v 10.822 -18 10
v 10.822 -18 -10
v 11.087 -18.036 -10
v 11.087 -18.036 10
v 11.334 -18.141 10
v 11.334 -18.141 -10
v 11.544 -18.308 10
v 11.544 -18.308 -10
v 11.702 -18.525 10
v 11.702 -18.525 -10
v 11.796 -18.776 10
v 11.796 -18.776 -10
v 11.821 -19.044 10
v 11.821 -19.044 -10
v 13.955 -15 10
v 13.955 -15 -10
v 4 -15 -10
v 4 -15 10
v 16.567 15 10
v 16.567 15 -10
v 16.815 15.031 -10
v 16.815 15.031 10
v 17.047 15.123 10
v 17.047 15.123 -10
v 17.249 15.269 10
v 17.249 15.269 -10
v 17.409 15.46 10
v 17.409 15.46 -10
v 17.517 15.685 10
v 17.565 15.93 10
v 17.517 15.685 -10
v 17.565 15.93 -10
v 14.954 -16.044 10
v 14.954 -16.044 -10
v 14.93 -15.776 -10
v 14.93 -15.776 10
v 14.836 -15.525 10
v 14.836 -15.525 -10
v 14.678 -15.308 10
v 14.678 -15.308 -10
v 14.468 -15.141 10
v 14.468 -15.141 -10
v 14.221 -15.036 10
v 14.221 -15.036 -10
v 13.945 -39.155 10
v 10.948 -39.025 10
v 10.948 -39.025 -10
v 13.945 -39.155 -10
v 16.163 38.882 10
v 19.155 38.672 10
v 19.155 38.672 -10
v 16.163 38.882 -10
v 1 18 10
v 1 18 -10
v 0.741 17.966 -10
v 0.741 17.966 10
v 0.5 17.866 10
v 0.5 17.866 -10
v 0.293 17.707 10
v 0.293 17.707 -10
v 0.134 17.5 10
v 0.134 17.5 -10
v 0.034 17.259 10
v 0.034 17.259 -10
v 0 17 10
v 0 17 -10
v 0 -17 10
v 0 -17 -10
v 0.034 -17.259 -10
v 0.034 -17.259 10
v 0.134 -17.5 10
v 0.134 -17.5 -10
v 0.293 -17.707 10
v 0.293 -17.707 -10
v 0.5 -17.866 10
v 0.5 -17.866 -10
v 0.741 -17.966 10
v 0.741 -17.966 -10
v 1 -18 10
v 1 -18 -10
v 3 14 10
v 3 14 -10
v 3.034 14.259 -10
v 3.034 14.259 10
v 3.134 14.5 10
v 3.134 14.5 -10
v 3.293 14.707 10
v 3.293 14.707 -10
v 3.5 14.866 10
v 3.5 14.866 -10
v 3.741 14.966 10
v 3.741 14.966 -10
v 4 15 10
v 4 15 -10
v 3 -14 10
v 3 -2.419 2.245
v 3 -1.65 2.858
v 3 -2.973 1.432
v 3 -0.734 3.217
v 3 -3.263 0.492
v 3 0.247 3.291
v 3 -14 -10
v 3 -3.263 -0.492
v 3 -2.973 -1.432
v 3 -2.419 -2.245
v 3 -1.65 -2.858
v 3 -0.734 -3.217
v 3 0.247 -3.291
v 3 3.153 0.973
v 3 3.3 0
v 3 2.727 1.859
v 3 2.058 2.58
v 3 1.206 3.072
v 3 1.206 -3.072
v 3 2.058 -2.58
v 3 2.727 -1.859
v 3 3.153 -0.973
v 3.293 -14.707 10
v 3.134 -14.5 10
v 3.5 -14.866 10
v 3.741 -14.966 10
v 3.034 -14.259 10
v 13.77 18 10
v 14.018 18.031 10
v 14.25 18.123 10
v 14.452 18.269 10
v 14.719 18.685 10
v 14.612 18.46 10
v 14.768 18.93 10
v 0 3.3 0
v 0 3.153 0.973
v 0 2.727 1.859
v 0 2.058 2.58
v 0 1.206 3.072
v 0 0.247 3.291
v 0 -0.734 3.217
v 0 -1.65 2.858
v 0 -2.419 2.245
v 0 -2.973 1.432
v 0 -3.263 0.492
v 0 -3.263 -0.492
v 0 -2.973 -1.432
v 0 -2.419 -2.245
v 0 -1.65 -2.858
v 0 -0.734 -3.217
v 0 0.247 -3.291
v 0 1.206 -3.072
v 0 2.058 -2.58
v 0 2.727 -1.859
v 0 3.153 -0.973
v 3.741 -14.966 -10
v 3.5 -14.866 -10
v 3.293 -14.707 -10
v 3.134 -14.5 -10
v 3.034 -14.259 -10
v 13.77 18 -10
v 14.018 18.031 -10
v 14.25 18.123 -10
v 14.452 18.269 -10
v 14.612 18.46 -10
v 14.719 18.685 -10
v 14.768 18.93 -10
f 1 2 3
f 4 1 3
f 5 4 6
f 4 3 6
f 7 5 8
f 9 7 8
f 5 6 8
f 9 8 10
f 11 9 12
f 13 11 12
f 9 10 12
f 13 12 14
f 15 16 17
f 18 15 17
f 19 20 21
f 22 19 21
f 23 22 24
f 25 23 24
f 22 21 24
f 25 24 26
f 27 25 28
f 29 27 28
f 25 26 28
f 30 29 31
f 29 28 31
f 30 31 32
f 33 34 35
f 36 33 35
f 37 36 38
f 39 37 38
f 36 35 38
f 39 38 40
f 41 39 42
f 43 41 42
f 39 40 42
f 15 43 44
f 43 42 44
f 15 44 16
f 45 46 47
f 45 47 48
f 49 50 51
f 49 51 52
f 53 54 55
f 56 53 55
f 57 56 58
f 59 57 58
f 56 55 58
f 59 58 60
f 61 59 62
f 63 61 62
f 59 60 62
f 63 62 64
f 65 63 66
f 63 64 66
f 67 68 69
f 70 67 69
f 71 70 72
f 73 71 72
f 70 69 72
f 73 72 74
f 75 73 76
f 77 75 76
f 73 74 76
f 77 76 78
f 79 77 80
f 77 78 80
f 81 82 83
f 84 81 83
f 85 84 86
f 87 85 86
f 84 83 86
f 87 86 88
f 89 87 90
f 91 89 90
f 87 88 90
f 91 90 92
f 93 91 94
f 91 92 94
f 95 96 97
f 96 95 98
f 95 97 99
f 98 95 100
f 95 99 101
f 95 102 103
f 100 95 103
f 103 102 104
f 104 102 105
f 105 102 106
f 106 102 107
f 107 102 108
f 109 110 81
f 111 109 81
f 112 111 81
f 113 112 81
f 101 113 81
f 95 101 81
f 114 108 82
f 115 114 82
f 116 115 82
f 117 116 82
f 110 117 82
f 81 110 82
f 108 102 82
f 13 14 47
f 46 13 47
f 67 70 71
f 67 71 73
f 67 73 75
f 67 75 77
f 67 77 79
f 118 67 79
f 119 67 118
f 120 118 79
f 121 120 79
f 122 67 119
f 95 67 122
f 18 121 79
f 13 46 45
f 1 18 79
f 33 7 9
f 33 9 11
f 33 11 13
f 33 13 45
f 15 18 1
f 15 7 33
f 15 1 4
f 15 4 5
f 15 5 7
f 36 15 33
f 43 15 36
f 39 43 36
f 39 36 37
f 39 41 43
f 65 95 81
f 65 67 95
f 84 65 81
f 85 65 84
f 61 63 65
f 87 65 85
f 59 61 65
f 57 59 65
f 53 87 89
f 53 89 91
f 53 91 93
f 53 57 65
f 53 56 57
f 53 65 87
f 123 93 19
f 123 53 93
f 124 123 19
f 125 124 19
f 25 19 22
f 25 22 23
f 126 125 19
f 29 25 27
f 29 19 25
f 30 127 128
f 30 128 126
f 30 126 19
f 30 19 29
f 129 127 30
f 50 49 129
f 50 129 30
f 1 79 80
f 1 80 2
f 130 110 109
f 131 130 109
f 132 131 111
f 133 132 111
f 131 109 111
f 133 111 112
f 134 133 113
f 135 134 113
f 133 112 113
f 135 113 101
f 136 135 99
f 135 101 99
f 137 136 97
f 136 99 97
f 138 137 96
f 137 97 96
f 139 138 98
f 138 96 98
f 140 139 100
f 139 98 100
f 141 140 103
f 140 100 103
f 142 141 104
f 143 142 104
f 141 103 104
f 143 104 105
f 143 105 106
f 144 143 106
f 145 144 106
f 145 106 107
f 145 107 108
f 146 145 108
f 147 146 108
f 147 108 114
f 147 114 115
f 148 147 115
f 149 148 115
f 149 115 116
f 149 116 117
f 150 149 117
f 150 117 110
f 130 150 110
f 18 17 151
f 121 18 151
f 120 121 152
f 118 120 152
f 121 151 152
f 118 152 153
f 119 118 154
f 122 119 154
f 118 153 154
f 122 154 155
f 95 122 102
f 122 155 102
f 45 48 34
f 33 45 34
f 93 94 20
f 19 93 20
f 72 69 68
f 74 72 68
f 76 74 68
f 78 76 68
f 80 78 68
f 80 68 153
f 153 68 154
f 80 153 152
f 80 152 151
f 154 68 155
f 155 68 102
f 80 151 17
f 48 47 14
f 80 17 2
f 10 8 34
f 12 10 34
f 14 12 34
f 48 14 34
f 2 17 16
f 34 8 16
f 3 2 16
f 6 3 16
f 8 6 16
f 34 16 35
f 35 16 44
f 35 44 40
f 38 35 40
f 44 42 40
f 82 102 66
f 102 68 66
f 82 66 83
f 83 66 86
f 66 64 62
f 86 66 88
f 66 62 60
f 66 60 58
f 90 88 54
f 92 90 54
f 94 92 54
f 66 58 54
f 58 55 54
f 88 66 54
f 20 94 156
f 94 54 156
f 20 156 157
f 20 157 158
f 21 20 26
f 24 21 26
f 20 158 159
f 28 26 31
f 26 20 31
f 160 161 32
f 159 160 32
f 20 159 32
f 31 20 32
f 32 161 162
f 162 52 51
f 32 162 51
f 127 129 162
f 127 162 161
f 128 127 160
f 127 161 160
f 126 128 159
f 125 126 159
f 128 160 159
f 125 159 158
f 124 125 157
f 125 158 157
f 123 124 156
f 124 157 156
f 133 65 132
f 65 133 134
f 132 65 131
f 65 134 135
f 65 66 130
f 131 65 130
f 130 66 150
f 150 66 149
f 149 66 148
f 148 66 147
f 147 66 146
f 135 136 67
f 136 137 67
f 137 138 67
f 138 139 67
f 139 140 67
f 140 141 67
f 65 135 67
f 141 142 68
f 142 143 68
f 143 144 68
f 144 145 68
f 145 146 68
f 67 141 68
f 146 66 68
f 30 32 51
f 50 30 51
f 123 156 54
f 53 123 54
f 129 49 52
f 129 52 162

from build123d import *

# Parameters (mm, degrees)
EXTRUDE_1_DEPTH      = 10
EXTRUDE_1_DEPTH_BACK = 10
HOLE_WIZARD_M61_D    = 6.6


with BuildPart() as part:
    # Эскиз1 → Бобышка-Вытянуть1 (new, two sides: drawn at the far end of the back side and taken through both)
    with BuildSketch(Plane.XY.offset(-EXTRUDE_1_DEPTH_BACK)):
        with BuildLine():
            Line((0, 17), (0, -17))
            ThreePointArc((0, -17), (0.292893219, -17.707106781), (1, -18))
            Line((1, -18), (10.821545488, -18))
            ThreePointArc((10.821545488, -18), (11.54390945, -18.308486944), (11.820593709, -19.043619387))
            Line((11.820593709, -19.043619387), (10.948205962, -39.024583819))
            Line((10.948205962, -39.024583819), (13.945350627, -39.155441981))
            Line((13.945350627, -39.155441981), (14.954434594, -16.043619387))
            ThreePointArc((14.954434594, -16.043619387), (14.677750334, -15.308486944), (13.955386372, -15))
            Line((13.955386372, -15), (4, -15))
            ThreePointArc((4, -15), (3.292893219, -14.707106781), (3, -14))
            Line((3, -14), (3, 14))
            ThreePointArc((3, 14), (3.292893219, 14.707106781), (4, 15))
            Line((4, 15), (16.567484914, 15))
            ThreePointArc((16.567484914, 15), (17.249483274, 15.268646298), (17.565048964, 15.930243526))
            Line((17.565048964, 15.930243526), (19.155325331, 38.67225511))
            Line((19.155325331, 38.67225511), (16.162633181, 38.881524531))
            Line((16.162633181, 38.881524531), (14.767503706, 18.930243526))
            ThreePointArc((14.767503706, 18.930243526), (14.451938016, 18.268646298), (13.769939655, 18))
            Line((13.769939655, 18), (1, 18))
            ThreePointArc((1, 18), (0.292893219, 17.707106781), (0, 17))
        make_face()
    extrude(amount=EXTRUDE_1_DEPTH + EXTRUDE_1_DEPTH_BACK)

    # Отверстие с зазором M61 (through all)
    with Locations(Plane(origin=(0, 0, 0), x_dir=(0, -1, 0), z_dir=(-1, 0, 0))):
        with Locations((0, 0)):
            Hole(HOLE_WIZARD_M61_D / 2)


solid = part.part
